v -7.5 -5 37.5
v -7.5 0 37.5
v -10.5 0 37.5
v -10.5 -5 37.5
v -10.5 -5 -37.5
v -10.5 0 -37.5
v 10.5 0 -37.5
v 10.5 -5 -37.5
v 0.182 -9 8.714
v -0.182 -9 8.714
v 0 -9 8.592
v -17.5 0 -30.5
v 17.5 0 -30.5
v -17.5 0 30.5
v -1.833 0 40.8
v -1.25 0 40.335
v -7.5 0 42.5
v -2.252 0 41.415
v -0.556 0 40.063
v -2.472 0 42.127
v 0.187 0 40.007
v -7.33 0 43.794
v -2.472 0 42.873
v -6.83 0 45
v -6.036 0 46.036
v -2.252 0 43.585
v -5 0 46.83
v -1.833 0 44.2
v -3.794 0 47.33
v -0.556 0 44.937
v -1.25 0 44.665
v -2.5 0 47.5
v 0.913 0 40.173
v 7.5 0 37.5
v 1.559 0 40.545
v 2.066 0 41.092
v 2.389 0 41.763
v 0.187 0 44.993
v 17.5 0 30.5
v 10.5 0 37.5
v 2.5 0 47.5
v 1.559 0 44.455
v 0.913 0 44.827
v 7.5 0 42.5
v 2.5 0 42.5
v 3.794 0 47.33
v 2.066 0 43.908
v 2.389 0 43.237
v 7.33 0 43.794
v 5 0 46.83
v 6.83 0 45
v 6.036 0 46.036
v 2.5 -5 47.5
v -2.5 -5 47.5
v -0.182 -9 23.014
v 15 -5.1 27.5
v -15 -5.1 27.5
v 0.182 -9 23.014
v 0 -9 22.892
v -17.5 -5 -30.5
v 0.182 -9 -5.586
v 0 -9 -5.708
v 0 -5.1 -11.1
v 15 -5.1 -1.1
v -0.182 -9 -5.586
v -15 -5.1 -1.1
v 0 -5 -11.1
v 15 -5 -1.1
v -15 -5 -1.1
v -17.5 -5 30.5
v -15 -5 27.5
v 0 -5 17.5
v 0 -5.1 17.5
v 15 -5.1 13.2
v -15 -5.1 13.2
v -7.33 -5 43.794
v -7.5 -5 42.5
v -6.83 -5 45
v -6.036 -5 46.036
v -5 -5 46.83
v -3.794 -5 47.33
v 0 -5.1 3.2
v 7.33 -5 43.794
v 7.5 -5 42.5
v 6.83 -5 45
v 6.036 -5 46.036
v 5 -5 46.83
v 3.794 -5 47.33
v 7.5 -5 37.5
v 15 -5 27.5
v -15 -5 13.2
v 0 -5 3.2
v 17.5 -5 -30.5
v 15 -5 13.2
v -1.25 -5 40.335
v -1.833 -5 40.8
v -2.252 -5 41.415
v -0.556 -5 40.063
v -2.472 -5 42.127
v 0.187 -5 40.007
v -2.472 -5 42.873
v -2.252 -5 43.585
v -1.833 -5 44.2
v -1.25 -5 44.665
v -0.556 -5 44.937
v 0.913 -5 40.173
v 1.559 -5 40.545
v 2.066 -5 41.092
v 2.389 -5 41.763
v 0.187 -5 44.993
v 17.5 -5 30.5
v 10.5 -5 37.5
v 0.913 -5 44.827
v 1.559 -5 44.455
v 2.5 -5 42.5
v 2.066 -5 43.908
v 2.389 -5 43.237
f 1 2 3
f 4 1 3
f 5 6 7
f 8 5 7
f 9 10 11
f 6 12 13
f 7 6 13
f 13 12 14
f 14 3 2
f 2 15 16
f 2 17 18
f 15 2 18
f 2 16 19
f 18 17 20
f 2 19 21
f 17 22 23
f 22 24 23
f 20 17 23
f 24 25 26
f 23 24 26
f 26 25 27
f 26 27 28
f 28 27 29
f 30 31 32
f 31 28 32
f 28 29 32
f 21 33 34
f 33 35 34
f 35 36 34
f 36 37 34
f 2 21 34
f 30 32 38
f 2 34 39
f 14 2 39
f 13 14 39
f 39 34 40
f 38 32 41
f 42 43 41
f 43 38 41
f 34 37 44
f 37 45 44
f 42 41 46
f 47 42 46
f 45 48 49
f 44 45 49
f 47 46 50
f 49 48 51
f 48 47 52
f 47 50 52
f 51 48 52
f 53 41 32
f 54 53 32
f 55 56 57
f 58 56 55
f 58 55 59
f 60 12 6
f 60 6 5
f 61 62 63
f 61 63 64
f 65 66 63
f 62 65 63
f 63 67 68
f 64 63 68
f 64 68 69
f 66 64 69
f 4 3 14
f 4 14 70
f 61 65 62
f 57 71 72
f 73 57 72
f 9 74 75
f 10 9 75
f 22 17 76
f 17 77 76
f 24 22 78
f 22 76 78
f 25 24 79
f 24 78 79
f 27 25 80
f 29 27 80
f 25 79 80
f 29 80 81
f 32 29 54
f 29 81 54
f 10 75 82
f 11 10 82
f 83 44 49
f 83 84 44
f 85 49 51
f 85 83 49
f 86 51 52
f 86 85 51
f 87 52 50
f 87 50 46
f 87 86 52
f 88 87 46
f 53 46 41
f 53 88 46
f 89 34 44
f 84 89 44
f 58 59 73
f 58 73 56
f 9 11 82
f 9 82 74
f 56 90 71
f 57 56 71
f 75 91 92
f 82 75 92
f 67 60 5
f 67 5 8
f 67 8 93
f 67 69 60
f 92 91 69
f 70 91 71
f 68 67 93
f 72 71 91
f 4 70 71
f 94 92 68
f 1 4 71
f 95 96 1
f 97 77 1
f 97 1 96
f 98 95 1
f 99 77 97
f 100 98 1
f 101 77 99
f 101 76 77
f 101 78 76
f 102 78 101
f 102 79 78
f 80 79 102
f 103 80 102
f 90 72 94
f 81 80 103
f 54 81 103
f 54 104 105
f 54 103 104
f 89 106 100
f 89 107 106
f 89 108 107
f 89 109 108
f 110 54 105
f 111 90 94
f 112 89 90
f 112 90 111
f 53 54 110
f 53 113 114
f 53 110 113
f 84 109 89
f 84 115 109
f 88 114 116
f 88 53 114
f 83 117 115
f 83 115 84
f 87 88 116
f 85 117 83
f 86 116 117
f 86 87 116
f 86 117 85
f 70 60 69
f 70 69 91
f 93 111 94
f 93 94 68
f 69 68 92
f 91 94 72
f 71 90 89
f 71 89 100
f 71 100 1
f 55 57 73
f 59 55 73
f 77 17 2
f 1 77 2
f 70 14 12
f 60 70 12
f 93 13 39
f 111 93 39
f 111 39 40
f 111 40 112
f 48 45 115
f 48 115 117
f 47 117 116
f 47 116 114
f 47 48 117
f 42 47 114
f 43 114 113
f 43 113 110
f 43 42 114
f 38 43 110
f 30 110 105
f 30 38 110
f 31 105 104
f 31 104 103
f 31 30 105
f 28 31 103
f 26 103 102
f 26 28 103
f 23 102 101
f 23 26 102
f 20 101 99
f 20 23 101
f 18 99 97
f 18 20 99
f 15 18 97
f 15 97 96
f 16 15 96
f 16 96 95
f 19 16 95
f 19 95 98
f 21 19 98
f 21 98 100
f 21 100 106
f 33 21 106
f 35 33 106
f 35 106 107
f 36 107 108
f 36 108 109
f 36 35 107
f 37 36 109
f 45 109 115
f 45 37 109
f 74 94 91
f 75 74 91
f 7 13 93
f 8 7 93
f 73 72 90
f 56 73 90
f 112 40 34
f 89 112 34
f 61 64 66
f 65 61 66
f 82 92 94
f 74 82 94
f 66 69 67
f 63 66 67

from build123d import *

# Parameters (mm, degrees)
F0_R       = 2.5
F1_DEPTH   = 5
F2_SIZE    = 7
F3_DEPTH   = 10
F4_R       = 5
F5_DEPTH   = 9
F6_SIZE2   = 3.9
F6_SIZE    = 4.4864367882
F6_2_SIZE2 = 3.9
F6_2_SIZE  = 4.4864367882
F6_3_SIZE2 = 3.9
F6_3_SIZE  = 4.4864367882


# Not quite as in the source:
# - a feature names something its author has since deleted; it is built from what else it names


with BuildPart() as f1:
    # F0 (on Front) → F1 (new body)
    with BuildSketch(Plane.XZ):
        Polygon((17.5, -37.5), (17.5, 37.5), (7.5, 37.5), (0, 37.5), (-7.5, 37.5), (-17.5, 37.5), (-17.5, -37.5), align=None)
        Polygon((0, -11.1), (-15, -1.1), (15, -1.1), align=None, mode=Mode.SUBTRACT)
        Polygon((0, 3.2), (-15, 13.2), (15, 13.2), align=None, mode=Mode.SUBTRACT)
        Polygon((0, 17.5), (-15, 27.5), (15, 27.5), align=None, mode=Mode.SUBTRACT)
        Polygon((0, 37.5), (7.5, 37.5), (7.5, 47.5), (0, 47.5), (-7.5, 47.5), (-7.5, 37.5), align=None)
        with Locations((0, 42.5)):
            Circle(F0_R, mode=Mode.SUBTRACT)
    extrude(amount=F1_DEPTH)

    # F2
    f2_edges = [f1.edges().sort_by_distance(p)[0] for p in [
        (-17.5, -2.5, 37.5),
        (17.5, -2.5, 37.5),
        (-17.5, -2.5, -37.5),
        (17.5, -2.5, -37.5),
    ]]
    chamfer(f2_edges, length=F2_SIZE)

    # F0 (on Front) → F3 (cut)
    with BuildSketch(Plane.XZ):
        with Locations((0, 42.5)):
            Circle(F0_R)
    extrude(amount=-F3_DEPTH, mode=Mode.SUBTRACT)

    # F4
    f4_edges = [f1.edges().sort_by_distance(p)[0] for p in [
        (-7.5, -2.5, 47.5),
        (7.5, -2.5, 47.5),
    ]]
    fillet(f4_edges, radius=F4_R)

    # F0 (on Front) → F5 (join)
    with BuildSketch(Plane.XZ):
        Polygon((15, 27.5), (-15, 27.5), (0, 17.5), align=None)
        Polygon((15, 13.2), (-15, 13.2), (0, 3.2), align=None)
        Polygon((15, -1.1), (-15, -1.1), (0, -11.1), align=None)
    extrude(amount=F5_DEPTH)

    # F6
    f6_edges = [f1.edges().sort_by_distance(p)[0] for p in [
        (0, -9, -1.1),
        (-7.5, -9, -6.1),
        (7.5, -9, -6.1),
    ]]
    f6_side = f1.faces().sort_by_distance((0, -9, -4.433333))[0]
    chamfer(f6_edges, length=F6_SIZE, length2=F6_SIZE2, reference=f6_side)

    # F6#2
    f6_2_edges = [f1.edges().sort_by_distance(p)[0] for p in [
        (0, -9, 13.2),
        (-7.5, -9, 8.2),
        (7.5, -9, 8.2),
    ]]
    f6_2_side = f1.faces().sort_by_distance((0, -9, 9.866667))[0]
    chamfer(f6_2_edges, length=F6_2_SIZE, length2=F6_2_SIZE2, reference=f6_2_side)

    # F6#3
    f6_3_edges = [f1.edges().sort_by_distance(p)[0] for p in [
        (0, -9, 27.5),
        (-7.5, -9, 22.5),
        (7.5, -9, 22.5),
    ]]
    f6_3_side = f1.faces().sort_by_distance((0, -9, 24.166667))[0]
    chamfer(f6_3_edges, length=F6_3_SIZE, length2=F6_3_SIZE2, reference=f6_3_side)


solid = f1.part
